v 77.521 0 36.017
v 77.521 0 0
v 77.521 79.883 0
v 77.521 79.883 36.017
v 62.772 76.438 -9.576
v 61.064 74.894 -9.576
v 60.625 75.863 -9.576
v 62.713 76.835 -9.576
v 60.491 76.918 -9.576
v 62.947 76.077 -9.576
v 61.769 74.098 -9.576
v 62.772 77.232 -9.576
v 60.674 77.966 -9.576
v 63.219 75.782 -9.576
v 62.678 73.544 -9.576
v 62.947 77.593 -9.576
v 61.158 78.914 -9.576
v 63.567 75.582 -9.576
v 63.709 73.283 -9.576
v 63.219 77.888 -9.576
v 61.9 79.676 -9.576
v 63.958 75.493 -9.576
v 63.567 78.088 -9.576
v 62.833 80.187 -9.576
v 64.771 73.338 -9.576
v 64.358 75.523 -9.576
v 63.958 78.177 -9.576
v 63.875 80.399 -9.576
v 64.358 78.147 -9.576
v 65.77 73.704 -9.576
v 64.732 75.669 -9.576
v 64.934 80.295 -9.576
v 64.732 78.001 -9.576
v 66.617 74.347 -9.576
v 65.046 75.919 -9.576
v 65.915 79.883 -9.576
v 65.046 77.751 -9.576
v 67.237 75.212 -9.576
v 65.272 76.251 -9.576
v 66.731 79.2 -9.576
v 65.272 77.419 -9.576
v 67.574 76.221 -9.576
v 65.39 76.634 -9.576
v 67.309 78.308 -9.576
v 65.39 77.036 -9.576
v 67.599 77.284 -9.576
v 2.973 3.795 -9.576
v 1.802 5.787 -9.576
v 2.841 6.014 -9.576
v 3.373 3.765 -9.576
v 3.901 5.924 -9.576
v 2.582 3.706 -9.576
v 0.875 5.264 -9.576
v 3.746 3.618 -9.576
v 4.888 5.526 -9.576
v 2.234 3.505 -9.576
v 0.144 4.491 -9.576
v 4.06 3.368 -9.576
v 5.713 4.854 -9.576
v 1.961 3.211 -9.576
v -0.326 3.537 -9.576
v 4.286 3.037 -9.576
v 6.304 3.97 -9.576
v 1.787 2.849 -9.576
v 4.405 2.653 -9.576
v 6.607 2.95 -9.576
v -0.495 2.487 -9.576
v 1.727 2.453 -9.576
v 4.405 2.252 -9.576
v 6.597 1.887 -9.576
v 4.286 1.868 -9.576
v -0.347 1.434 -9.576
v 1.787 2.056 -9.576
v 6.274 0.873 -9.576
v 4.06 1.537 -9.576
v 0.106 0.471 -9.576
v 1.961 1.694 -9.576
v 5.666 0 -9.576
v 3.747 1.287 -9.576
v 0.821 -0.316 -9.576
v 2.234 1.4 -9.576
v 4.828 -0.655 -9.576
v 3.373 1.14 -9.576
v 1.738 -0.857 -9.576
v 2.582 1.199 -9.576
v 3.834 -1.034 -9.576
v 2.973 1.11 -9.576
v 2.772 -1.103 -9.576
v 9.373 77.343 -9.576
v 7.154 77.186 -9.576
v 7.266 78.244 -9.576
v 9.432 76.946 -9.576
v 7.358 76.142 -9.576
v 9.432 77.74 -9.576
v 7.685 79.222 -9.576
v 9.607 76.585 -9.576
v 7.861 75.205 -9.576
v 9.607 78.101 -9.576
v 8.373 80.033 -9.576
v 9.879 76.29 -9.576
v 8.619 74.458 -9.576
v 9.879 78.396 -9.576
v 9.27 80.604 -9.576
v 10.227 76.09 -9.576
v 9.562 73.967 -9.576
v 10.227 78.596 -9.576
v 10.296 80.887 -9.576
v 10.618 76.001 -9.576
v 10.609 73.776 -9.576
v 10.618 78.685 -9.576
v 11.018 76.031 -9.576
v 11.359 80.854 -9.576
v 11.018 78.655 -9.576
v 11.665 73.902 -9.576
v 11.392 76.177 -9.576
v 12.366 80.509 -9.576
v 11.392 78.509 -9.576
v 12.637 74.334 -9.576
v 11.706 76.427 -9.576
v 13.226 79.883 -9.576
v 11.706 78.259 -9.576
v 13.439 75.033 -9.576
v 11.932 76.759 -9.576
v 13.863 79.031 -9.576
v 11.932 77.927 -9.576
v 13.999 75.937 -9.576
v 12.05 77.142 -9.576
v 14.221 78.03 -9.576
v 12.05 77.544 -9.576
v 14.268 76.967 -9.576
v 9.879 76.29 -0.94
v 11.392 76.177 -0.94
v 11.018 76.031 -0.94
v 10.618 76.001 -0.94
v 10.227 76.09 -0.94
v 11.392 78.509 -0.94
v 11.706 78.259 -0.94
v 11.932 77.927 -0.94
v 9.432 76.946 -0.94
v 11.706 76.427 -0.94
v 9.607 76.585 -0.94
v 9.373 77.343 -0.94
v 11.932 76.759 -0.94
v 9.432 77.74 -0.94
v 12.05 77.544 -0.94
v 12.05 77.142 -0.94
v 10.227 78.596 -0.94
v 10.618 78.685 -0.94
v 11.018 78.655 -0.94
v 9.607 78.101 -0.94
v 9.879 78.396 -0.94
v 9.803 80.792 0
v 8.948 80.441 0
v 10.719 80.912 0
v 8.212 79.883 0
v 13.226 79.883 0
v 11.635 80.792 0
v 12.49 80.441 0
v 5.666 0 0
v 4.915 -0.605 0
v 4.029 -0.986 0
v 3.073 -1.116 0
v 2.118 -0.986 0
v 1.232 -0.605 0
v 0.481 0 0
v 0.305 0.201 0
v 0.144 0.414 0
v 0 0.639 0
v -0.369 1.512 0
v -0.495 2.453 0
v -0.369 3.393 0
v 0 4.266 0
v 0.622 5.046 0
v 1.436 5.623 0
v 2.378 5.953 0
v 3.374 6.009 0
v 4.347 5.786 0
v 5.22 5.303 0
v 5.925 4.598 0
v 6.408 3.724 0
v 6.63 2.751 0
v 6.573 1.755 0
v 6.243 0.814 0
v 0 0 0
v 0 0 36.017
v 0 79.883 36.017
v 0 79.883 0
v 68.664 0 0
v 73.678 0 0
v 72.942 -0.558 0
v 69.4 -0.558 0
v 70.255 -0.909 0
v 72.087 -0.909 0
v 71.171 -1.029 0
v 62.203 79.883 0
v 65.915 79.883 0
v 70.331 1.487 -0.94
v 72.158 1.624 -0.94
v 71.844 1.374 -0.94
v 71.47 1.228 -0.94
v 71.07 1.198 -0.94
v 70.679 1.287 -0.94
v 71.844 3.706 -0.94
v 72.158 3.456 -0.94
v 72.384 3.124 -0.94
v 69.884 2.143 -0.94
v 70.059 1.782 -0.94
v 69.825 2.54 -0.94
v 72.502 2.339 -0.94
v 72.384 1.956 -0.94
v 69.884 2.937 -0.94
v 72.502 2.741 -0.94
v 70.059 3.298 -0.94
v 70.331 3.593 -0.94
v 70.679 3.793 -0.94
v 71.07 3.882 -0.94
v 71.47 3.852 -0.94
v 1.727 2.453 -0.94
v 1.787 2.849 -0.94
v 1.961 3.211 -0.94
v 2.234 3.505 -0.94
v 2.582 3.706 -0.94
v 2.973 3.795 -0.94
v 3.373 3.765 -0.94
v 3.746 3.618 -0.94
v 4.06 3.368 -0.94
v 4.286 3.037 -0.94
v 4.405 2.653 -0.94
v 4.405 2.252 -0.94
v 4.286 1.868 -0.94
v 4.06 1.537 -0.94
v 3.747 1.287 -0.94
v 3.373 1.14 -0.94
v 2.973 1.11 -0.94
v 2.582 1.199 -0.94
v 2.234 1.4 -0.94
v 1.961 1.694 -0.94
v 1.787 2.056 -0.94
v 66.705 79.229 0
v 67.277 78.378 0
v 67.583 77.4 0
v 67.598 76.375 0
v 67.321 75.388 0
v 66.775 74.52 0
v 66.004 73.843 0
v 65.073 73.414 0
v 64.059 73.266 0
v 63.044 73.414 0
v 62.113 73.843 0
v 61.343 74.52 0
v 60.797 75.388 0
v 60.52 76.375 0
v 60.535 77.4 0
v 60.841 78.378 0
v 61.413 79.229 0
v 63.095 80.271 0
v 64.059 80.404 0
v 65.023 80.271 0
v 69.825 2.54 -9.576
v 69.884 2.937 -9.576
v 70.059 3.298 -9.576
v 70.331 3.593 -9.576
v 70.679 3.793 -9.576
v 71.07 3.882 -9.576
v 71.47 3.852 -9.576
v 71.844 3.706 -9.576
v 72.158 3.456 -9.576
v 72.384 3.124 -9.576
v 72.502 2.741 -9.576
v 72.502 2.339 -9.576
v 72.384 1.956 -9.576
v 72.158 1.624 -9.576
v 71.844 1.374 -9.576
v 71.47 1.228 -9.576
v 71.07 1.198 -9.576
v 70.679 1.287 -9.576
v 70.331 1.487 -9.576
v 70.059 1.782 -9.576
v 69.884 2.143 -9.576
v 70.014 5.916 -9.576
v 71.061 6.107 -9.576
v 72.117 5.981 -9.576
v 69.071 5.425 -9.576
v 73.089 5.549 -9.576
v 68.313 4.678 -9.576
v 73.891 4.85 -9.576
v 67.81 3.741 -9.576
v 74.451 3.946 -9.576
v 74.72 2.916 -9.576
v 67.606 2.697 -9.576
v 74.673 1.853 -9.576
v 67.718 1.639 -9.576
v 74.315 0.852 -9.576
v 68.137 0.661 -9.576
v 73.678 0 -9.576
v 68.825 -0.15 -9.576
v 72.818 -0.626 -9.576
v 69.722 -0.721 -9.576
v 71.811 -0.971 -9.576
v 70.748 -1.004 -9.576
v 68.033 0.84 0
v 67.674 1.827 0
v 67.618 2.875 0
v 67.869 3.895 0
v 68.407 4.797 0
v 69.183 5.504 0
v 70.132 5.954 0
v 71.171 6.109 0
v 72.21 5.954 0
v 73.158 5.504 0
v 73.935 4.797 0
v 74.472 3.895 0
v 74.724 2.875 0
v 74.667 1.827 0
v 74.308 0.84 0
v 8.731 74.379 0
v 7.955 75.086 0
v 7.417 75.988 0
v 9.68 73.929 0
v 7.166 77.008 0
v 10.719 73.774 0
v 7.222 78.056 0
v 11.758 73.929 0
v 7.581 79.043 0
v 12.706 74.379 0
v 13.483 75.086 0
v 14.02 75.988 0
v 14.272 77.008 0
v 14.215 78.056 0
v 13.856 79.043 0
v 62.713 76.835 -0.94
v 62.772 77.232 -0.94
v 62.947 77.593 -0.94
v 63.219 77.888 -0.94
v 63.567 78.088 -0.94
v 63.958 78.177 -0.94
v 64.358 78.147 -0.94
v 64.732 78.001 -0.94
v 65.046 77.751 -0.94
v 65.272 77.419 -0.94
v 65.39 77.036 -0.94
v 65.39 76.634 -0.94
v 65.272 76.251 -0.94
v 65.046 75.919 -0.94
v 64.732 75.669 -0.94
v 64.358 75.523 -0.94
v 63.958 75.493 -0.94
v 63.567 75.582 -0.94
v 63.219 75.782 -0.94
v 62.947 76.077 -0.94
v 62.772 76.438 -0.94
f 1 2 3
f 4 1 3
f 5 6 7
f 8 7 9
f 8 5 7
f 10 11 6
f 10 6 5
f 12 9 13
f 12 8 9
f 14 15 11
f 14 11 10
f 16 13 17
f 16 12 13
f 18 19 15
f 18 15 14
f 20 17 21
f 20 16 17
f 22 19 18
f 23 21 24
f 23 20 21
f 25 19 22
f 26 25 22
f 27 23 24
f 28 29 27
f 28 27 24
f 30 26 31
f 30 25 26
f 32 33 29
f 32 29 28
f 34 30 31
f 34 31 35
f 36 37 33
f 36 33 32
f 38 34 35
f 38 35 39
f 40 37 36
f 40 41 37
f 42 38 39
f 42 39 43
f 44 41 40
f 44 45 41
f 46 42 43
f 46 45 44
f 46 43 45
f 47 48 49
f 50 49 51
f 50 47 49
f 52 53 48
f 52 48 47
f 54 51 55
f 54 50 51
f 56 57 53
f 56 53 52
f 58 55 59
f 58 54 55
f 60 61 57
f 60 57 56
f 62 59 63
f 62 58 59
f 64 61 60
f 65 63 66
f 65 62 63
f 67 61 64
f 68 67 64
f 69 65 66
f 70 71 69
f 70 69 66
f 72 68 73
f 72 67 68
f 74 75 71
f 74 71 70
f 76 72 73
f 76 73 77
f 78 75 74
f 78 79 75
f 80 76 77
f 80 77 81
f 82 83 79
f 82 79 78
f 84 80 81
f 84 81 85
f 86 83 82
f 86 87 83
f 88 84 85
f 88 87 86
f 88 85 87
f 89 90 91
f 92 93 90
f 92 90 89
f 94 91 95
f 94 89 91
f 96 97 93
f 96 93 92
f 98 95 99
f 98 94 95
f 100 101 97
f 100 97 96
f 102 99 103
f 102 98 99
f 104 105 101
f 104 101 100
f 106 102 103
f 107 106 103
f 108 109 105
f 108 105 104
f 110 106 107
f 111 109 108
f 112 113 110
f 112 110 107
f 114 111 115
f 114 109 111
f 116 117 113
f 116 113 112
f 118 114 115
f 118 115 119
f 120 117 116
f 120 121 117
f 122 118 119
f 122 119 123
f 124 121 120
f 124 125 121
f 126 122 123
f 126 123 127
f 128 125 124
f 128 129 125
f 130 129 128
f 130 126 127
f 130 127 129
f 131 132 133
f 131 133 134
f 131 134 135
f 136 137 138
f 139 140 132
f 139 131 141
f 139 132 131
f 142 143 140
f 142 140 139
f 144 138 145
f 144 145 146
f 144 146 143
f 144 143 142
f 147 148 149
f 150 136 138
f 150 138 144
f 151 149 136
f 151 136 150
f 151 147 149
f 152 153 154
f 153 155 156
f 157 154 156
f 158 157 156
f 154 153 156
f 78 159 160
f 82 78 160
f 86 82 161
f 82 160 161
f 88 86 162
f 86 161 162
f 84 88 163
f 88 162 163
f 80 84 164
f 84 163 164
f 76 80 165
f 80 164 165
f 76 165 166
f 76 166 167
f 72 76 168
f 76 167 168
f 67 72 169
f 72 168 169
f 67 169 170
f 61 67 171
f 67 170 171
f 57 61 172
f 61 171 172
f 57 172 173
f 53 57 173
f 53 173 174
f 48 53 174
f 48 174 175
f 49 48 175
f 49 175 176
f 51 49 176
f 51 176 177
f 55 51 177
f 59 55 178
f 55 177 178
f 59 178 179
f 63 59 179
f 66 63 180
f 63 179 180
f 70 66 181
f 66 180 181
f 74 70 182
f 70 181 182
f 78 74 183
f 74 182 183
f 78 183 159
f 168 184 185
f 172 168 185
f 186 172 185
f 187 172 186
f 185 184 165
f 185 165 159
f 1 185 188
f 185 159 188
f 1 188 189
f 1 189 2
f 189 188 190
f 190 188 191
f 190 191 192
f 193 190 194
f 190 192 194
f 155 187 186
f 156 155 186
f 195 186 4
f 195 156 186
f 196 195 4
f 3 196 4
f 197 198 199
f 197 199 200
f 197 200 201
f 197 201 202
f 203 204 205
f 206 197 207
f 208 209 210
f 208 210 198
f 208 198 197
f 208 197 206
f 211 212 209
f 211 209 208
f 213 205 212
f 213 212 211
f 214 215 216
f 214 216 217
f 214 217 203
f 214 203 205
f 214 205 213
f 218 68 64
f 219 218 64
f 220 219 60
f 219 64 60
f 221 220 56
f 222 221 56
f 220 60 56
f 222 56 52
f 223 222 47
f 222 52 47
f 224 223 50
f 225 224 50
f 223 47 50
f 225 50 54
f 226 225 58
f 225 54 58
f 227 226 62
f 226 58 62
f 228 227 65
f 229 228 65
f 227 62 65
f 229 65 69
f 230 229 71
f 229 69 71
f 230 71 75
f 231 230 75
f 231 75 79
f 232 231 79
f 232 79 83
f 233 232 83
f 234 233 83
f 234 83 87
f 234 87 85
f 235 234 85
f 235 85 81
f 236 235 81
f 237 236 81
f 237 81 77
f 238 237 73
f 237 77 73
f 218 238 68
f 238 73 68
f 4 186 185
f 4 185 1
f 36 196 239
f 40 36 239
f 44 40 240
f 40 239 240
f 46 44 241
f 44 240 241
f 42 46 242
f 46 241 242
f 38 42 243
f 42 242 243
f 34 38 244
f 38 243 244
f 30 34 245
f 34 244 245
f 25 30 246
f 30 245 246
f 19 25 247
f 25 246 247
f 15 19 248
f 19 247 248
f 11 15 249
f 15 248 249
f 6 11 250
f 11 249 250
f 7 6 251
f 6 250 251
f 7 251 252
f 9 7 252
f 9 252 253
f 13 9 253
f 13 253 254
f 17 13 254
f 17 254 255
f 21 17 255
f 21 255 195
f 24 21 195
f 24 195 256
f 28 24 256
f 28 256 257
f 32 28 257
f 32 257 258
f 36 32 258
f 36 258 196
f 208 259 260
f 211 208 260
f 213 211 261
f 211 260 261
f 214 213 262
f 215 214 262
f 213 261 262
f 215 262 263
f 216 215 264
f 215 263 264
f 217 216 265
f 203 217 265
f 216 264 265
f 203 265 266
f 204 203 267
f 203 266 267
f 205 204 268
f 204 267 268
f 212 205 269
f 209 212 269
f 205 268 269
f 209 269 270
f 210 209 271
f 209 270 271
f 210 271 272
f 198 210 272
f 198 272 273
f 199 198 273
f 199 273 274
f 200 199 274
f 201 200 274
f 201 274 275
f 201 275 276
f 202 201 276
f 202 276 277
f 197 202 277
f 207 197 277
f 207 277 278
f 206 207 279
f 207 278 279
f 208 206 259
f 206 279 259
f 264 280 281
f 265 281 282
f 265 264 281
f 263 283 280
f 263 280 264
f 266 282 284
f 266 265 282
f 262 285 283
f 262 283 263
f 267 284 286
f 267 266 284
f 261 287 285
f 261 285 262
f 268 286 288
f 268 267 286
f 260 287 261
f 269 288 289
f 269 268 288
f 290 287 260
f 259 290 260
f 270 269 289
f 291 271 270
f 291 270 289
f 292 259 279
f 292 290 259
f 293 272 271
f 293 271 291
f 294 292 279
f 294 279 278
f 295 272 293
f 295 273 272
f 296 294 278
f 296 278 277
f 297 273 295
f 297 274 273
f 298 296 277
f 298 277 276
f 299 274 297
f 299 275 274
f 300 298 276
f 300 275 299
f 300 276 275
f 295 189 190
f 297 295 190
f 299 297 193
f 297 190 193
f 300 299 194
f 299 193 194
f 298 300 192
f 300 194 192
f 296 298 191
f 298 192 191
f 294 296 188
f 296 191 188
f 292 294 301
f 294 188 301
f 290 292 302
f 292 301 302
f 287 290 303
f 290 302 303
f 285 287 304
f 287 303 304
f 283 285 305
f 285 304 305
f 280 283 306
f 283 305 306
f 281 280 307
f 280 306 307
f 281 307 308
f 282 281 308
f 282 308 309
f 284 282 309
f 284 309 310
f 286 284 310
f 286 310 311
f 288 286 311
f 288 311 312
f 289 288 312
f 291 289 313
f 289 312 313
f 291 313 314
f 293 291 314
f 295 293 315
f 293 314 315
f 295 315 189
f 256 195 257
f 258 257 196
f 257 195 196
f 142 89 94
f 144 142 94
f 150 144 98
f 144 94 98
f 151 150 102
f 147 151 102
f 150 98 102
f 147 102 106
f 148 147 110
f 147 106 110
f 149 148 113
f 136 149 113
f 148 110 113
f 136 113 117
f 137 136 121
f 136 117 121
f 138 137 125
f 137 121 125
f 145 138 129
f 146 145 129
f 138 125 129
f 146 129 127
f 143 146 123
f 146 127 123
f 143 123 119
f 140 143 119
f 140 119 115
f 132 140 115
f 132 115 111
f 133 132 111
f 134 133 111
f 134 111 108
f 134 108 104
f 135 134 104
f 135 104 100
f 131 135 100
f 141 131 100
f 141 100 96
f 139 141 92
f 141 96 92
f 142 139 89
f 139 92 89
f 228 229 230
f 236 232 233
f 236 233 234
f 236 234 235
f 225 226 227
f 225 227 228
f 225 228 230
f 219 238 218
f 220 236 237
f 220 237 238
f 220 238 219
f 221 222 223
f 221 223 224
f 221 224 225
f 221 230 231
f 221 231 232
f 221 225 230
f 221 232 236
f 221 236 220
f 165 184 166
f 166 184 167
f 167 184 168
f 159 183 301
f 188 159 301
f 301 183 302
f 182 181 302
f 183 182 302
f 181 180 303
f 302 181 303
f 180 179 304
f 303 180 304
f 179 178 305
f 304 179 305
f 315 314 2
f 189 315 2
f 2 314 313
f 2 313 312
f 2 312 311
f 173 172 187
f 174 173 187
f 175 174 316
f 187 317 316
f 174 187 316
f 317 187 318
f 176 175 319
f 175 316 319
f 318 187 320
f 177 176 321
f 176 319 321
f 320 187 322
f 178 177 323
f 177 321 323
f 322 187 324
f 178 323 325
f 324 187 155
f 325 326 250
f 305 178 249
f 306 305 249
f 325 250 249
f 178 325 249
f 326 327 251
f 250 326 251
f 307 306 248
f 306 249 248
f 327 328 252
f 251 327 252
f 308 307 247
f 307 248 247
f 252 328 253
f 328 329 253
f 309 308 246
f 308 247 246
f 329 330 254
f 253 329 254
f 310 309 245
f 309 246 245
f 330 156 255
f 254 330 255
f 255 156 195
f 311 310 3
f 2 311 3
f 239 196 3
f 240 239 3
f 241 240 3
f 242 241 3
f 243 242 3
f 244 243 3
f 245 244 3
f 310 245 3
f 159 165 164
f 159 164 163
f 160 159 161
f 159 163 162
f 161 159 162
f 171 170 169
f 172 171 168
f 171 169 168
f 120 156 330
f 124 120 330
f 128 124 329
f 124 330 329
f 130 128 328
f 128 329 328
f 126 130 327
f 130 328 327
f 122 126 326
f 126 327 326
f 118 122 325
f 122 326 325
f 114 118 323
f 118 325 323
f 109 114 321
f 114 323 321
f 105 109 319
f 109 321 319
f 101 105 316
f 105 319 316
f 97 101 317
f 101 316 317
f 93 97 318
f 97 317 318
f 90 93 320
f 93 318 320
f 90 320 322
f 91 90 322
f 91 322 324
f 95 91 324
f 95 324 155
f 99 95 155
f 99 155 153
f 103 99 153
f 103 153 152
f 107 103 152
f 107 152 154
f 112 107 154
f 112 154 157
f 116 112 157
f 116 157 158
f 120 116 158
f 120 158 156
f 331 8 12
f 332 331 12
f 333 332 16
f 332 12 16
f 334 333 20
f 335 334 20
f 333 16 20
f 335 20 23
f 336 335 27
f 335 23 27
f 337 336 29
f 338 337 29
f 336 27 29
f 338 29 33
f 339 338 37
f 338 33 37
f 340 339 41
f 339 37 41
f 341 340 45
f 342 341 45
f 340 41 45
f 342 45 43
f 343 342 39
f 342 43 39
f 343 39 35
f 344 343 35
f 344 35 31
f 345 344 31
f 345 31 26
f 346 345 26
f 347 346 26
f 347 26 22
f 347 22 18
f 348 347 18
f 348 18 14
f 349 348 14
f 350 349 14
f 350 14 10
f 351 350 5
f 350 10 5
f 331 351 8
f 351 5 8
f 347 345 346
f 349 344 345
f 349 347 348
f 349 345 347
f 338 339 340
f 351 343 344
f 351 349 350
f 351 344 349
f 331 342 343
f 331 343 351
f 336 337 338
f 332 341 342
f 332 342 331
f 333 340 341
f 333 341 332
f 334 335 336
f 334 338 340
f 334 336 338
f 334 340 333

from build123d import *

# Parameters (mm, degrees)
SKETCH1_W           = 77.5208
SKETCH1_H           = 79.883
BOSS_EXTRUDE1_DEPTH = 36.0172
SKETCH4_R           = 3.5687
BOSS_EXTRUDE2_DEPTH = 9.5758
SKETCH5_R           = 3.5687
BOSS_EXTRUDE3_DEPTH = 9.5758
SKETCH6_R           = 1.3462
CUT_EXTRUDE1_DEPTH  = 8.636


with BuildPart() as part:
    # Sketch1 → Boss-Extrude1 (new body)
    with BuildSketch(Plane.XY):
        with Locations((38.7604, 39.9415)):
            Rectangle(SKETCH1_W, SKETCH1_H)
    extrude(amount=BOSS_EXTRUDE1_DEPTH)

    # Sketch4 → Boss-Extrude2 (add)
    with BuildSketch(Plane(origin=(0, 0, 0), x_dir=(-1, 0, 0), z_dir=(0, 0, -1))):
        with Locations(Location((-71.1708, 2.54, 0), (0, 0, 225.376971118))):
            Circle(SKETCH4_R)
        with Locations(Location((-3.0734, 2.452500211, 0), (0, 0, 223.410850824))):
            Circle(SKETCH4_R)
    extrude(amount=BOSS_EXTRUDE2_DEPTH)

    # Sketch5 → Boss-Extrude3 (add)
    with BuildSketch(Plane(origin=(0, 0, 0), x_dir=(-1, 0, 0), z_dir=(0, 0, -1))):
        with Locations(Location((-10.7188, 77.343, 0), (0, 0, 134.623028882))):
            Circle(SKETCH5_R)
        with Locations(Location((-64.0588, 76.835, 0), (0, 0, 121.340374815))):
            Circle(SKETCH5_R)
    extrude(amount=BOSS_EXTRUDE3_DEPTH)

    # Sketch6 → Cut-Extrude1 (cut)
    with BuildSketch(Plane(origin=(0, 0, -9.5758), x_dir=(-1, 0, 0), z_dir=(0, 0, -1))):
        with Locations((-71.1708, 2.54)):
            Circle(SKETCH6_R)
        with Locations((-3.0734, 2.452500211)):
            Circle(SKETCH6_R)
        with Locations((-10.7188, 77.343)):
            Circle(SKETCH6_R)
        with Locations((-64.0588, 76.835)):
            Circle(SKETCH6_R)
    extrude(amount=-CUT_EXTRUDE1_DEPTH, mode=Mode.SUBTRACT)


solid = part.part
